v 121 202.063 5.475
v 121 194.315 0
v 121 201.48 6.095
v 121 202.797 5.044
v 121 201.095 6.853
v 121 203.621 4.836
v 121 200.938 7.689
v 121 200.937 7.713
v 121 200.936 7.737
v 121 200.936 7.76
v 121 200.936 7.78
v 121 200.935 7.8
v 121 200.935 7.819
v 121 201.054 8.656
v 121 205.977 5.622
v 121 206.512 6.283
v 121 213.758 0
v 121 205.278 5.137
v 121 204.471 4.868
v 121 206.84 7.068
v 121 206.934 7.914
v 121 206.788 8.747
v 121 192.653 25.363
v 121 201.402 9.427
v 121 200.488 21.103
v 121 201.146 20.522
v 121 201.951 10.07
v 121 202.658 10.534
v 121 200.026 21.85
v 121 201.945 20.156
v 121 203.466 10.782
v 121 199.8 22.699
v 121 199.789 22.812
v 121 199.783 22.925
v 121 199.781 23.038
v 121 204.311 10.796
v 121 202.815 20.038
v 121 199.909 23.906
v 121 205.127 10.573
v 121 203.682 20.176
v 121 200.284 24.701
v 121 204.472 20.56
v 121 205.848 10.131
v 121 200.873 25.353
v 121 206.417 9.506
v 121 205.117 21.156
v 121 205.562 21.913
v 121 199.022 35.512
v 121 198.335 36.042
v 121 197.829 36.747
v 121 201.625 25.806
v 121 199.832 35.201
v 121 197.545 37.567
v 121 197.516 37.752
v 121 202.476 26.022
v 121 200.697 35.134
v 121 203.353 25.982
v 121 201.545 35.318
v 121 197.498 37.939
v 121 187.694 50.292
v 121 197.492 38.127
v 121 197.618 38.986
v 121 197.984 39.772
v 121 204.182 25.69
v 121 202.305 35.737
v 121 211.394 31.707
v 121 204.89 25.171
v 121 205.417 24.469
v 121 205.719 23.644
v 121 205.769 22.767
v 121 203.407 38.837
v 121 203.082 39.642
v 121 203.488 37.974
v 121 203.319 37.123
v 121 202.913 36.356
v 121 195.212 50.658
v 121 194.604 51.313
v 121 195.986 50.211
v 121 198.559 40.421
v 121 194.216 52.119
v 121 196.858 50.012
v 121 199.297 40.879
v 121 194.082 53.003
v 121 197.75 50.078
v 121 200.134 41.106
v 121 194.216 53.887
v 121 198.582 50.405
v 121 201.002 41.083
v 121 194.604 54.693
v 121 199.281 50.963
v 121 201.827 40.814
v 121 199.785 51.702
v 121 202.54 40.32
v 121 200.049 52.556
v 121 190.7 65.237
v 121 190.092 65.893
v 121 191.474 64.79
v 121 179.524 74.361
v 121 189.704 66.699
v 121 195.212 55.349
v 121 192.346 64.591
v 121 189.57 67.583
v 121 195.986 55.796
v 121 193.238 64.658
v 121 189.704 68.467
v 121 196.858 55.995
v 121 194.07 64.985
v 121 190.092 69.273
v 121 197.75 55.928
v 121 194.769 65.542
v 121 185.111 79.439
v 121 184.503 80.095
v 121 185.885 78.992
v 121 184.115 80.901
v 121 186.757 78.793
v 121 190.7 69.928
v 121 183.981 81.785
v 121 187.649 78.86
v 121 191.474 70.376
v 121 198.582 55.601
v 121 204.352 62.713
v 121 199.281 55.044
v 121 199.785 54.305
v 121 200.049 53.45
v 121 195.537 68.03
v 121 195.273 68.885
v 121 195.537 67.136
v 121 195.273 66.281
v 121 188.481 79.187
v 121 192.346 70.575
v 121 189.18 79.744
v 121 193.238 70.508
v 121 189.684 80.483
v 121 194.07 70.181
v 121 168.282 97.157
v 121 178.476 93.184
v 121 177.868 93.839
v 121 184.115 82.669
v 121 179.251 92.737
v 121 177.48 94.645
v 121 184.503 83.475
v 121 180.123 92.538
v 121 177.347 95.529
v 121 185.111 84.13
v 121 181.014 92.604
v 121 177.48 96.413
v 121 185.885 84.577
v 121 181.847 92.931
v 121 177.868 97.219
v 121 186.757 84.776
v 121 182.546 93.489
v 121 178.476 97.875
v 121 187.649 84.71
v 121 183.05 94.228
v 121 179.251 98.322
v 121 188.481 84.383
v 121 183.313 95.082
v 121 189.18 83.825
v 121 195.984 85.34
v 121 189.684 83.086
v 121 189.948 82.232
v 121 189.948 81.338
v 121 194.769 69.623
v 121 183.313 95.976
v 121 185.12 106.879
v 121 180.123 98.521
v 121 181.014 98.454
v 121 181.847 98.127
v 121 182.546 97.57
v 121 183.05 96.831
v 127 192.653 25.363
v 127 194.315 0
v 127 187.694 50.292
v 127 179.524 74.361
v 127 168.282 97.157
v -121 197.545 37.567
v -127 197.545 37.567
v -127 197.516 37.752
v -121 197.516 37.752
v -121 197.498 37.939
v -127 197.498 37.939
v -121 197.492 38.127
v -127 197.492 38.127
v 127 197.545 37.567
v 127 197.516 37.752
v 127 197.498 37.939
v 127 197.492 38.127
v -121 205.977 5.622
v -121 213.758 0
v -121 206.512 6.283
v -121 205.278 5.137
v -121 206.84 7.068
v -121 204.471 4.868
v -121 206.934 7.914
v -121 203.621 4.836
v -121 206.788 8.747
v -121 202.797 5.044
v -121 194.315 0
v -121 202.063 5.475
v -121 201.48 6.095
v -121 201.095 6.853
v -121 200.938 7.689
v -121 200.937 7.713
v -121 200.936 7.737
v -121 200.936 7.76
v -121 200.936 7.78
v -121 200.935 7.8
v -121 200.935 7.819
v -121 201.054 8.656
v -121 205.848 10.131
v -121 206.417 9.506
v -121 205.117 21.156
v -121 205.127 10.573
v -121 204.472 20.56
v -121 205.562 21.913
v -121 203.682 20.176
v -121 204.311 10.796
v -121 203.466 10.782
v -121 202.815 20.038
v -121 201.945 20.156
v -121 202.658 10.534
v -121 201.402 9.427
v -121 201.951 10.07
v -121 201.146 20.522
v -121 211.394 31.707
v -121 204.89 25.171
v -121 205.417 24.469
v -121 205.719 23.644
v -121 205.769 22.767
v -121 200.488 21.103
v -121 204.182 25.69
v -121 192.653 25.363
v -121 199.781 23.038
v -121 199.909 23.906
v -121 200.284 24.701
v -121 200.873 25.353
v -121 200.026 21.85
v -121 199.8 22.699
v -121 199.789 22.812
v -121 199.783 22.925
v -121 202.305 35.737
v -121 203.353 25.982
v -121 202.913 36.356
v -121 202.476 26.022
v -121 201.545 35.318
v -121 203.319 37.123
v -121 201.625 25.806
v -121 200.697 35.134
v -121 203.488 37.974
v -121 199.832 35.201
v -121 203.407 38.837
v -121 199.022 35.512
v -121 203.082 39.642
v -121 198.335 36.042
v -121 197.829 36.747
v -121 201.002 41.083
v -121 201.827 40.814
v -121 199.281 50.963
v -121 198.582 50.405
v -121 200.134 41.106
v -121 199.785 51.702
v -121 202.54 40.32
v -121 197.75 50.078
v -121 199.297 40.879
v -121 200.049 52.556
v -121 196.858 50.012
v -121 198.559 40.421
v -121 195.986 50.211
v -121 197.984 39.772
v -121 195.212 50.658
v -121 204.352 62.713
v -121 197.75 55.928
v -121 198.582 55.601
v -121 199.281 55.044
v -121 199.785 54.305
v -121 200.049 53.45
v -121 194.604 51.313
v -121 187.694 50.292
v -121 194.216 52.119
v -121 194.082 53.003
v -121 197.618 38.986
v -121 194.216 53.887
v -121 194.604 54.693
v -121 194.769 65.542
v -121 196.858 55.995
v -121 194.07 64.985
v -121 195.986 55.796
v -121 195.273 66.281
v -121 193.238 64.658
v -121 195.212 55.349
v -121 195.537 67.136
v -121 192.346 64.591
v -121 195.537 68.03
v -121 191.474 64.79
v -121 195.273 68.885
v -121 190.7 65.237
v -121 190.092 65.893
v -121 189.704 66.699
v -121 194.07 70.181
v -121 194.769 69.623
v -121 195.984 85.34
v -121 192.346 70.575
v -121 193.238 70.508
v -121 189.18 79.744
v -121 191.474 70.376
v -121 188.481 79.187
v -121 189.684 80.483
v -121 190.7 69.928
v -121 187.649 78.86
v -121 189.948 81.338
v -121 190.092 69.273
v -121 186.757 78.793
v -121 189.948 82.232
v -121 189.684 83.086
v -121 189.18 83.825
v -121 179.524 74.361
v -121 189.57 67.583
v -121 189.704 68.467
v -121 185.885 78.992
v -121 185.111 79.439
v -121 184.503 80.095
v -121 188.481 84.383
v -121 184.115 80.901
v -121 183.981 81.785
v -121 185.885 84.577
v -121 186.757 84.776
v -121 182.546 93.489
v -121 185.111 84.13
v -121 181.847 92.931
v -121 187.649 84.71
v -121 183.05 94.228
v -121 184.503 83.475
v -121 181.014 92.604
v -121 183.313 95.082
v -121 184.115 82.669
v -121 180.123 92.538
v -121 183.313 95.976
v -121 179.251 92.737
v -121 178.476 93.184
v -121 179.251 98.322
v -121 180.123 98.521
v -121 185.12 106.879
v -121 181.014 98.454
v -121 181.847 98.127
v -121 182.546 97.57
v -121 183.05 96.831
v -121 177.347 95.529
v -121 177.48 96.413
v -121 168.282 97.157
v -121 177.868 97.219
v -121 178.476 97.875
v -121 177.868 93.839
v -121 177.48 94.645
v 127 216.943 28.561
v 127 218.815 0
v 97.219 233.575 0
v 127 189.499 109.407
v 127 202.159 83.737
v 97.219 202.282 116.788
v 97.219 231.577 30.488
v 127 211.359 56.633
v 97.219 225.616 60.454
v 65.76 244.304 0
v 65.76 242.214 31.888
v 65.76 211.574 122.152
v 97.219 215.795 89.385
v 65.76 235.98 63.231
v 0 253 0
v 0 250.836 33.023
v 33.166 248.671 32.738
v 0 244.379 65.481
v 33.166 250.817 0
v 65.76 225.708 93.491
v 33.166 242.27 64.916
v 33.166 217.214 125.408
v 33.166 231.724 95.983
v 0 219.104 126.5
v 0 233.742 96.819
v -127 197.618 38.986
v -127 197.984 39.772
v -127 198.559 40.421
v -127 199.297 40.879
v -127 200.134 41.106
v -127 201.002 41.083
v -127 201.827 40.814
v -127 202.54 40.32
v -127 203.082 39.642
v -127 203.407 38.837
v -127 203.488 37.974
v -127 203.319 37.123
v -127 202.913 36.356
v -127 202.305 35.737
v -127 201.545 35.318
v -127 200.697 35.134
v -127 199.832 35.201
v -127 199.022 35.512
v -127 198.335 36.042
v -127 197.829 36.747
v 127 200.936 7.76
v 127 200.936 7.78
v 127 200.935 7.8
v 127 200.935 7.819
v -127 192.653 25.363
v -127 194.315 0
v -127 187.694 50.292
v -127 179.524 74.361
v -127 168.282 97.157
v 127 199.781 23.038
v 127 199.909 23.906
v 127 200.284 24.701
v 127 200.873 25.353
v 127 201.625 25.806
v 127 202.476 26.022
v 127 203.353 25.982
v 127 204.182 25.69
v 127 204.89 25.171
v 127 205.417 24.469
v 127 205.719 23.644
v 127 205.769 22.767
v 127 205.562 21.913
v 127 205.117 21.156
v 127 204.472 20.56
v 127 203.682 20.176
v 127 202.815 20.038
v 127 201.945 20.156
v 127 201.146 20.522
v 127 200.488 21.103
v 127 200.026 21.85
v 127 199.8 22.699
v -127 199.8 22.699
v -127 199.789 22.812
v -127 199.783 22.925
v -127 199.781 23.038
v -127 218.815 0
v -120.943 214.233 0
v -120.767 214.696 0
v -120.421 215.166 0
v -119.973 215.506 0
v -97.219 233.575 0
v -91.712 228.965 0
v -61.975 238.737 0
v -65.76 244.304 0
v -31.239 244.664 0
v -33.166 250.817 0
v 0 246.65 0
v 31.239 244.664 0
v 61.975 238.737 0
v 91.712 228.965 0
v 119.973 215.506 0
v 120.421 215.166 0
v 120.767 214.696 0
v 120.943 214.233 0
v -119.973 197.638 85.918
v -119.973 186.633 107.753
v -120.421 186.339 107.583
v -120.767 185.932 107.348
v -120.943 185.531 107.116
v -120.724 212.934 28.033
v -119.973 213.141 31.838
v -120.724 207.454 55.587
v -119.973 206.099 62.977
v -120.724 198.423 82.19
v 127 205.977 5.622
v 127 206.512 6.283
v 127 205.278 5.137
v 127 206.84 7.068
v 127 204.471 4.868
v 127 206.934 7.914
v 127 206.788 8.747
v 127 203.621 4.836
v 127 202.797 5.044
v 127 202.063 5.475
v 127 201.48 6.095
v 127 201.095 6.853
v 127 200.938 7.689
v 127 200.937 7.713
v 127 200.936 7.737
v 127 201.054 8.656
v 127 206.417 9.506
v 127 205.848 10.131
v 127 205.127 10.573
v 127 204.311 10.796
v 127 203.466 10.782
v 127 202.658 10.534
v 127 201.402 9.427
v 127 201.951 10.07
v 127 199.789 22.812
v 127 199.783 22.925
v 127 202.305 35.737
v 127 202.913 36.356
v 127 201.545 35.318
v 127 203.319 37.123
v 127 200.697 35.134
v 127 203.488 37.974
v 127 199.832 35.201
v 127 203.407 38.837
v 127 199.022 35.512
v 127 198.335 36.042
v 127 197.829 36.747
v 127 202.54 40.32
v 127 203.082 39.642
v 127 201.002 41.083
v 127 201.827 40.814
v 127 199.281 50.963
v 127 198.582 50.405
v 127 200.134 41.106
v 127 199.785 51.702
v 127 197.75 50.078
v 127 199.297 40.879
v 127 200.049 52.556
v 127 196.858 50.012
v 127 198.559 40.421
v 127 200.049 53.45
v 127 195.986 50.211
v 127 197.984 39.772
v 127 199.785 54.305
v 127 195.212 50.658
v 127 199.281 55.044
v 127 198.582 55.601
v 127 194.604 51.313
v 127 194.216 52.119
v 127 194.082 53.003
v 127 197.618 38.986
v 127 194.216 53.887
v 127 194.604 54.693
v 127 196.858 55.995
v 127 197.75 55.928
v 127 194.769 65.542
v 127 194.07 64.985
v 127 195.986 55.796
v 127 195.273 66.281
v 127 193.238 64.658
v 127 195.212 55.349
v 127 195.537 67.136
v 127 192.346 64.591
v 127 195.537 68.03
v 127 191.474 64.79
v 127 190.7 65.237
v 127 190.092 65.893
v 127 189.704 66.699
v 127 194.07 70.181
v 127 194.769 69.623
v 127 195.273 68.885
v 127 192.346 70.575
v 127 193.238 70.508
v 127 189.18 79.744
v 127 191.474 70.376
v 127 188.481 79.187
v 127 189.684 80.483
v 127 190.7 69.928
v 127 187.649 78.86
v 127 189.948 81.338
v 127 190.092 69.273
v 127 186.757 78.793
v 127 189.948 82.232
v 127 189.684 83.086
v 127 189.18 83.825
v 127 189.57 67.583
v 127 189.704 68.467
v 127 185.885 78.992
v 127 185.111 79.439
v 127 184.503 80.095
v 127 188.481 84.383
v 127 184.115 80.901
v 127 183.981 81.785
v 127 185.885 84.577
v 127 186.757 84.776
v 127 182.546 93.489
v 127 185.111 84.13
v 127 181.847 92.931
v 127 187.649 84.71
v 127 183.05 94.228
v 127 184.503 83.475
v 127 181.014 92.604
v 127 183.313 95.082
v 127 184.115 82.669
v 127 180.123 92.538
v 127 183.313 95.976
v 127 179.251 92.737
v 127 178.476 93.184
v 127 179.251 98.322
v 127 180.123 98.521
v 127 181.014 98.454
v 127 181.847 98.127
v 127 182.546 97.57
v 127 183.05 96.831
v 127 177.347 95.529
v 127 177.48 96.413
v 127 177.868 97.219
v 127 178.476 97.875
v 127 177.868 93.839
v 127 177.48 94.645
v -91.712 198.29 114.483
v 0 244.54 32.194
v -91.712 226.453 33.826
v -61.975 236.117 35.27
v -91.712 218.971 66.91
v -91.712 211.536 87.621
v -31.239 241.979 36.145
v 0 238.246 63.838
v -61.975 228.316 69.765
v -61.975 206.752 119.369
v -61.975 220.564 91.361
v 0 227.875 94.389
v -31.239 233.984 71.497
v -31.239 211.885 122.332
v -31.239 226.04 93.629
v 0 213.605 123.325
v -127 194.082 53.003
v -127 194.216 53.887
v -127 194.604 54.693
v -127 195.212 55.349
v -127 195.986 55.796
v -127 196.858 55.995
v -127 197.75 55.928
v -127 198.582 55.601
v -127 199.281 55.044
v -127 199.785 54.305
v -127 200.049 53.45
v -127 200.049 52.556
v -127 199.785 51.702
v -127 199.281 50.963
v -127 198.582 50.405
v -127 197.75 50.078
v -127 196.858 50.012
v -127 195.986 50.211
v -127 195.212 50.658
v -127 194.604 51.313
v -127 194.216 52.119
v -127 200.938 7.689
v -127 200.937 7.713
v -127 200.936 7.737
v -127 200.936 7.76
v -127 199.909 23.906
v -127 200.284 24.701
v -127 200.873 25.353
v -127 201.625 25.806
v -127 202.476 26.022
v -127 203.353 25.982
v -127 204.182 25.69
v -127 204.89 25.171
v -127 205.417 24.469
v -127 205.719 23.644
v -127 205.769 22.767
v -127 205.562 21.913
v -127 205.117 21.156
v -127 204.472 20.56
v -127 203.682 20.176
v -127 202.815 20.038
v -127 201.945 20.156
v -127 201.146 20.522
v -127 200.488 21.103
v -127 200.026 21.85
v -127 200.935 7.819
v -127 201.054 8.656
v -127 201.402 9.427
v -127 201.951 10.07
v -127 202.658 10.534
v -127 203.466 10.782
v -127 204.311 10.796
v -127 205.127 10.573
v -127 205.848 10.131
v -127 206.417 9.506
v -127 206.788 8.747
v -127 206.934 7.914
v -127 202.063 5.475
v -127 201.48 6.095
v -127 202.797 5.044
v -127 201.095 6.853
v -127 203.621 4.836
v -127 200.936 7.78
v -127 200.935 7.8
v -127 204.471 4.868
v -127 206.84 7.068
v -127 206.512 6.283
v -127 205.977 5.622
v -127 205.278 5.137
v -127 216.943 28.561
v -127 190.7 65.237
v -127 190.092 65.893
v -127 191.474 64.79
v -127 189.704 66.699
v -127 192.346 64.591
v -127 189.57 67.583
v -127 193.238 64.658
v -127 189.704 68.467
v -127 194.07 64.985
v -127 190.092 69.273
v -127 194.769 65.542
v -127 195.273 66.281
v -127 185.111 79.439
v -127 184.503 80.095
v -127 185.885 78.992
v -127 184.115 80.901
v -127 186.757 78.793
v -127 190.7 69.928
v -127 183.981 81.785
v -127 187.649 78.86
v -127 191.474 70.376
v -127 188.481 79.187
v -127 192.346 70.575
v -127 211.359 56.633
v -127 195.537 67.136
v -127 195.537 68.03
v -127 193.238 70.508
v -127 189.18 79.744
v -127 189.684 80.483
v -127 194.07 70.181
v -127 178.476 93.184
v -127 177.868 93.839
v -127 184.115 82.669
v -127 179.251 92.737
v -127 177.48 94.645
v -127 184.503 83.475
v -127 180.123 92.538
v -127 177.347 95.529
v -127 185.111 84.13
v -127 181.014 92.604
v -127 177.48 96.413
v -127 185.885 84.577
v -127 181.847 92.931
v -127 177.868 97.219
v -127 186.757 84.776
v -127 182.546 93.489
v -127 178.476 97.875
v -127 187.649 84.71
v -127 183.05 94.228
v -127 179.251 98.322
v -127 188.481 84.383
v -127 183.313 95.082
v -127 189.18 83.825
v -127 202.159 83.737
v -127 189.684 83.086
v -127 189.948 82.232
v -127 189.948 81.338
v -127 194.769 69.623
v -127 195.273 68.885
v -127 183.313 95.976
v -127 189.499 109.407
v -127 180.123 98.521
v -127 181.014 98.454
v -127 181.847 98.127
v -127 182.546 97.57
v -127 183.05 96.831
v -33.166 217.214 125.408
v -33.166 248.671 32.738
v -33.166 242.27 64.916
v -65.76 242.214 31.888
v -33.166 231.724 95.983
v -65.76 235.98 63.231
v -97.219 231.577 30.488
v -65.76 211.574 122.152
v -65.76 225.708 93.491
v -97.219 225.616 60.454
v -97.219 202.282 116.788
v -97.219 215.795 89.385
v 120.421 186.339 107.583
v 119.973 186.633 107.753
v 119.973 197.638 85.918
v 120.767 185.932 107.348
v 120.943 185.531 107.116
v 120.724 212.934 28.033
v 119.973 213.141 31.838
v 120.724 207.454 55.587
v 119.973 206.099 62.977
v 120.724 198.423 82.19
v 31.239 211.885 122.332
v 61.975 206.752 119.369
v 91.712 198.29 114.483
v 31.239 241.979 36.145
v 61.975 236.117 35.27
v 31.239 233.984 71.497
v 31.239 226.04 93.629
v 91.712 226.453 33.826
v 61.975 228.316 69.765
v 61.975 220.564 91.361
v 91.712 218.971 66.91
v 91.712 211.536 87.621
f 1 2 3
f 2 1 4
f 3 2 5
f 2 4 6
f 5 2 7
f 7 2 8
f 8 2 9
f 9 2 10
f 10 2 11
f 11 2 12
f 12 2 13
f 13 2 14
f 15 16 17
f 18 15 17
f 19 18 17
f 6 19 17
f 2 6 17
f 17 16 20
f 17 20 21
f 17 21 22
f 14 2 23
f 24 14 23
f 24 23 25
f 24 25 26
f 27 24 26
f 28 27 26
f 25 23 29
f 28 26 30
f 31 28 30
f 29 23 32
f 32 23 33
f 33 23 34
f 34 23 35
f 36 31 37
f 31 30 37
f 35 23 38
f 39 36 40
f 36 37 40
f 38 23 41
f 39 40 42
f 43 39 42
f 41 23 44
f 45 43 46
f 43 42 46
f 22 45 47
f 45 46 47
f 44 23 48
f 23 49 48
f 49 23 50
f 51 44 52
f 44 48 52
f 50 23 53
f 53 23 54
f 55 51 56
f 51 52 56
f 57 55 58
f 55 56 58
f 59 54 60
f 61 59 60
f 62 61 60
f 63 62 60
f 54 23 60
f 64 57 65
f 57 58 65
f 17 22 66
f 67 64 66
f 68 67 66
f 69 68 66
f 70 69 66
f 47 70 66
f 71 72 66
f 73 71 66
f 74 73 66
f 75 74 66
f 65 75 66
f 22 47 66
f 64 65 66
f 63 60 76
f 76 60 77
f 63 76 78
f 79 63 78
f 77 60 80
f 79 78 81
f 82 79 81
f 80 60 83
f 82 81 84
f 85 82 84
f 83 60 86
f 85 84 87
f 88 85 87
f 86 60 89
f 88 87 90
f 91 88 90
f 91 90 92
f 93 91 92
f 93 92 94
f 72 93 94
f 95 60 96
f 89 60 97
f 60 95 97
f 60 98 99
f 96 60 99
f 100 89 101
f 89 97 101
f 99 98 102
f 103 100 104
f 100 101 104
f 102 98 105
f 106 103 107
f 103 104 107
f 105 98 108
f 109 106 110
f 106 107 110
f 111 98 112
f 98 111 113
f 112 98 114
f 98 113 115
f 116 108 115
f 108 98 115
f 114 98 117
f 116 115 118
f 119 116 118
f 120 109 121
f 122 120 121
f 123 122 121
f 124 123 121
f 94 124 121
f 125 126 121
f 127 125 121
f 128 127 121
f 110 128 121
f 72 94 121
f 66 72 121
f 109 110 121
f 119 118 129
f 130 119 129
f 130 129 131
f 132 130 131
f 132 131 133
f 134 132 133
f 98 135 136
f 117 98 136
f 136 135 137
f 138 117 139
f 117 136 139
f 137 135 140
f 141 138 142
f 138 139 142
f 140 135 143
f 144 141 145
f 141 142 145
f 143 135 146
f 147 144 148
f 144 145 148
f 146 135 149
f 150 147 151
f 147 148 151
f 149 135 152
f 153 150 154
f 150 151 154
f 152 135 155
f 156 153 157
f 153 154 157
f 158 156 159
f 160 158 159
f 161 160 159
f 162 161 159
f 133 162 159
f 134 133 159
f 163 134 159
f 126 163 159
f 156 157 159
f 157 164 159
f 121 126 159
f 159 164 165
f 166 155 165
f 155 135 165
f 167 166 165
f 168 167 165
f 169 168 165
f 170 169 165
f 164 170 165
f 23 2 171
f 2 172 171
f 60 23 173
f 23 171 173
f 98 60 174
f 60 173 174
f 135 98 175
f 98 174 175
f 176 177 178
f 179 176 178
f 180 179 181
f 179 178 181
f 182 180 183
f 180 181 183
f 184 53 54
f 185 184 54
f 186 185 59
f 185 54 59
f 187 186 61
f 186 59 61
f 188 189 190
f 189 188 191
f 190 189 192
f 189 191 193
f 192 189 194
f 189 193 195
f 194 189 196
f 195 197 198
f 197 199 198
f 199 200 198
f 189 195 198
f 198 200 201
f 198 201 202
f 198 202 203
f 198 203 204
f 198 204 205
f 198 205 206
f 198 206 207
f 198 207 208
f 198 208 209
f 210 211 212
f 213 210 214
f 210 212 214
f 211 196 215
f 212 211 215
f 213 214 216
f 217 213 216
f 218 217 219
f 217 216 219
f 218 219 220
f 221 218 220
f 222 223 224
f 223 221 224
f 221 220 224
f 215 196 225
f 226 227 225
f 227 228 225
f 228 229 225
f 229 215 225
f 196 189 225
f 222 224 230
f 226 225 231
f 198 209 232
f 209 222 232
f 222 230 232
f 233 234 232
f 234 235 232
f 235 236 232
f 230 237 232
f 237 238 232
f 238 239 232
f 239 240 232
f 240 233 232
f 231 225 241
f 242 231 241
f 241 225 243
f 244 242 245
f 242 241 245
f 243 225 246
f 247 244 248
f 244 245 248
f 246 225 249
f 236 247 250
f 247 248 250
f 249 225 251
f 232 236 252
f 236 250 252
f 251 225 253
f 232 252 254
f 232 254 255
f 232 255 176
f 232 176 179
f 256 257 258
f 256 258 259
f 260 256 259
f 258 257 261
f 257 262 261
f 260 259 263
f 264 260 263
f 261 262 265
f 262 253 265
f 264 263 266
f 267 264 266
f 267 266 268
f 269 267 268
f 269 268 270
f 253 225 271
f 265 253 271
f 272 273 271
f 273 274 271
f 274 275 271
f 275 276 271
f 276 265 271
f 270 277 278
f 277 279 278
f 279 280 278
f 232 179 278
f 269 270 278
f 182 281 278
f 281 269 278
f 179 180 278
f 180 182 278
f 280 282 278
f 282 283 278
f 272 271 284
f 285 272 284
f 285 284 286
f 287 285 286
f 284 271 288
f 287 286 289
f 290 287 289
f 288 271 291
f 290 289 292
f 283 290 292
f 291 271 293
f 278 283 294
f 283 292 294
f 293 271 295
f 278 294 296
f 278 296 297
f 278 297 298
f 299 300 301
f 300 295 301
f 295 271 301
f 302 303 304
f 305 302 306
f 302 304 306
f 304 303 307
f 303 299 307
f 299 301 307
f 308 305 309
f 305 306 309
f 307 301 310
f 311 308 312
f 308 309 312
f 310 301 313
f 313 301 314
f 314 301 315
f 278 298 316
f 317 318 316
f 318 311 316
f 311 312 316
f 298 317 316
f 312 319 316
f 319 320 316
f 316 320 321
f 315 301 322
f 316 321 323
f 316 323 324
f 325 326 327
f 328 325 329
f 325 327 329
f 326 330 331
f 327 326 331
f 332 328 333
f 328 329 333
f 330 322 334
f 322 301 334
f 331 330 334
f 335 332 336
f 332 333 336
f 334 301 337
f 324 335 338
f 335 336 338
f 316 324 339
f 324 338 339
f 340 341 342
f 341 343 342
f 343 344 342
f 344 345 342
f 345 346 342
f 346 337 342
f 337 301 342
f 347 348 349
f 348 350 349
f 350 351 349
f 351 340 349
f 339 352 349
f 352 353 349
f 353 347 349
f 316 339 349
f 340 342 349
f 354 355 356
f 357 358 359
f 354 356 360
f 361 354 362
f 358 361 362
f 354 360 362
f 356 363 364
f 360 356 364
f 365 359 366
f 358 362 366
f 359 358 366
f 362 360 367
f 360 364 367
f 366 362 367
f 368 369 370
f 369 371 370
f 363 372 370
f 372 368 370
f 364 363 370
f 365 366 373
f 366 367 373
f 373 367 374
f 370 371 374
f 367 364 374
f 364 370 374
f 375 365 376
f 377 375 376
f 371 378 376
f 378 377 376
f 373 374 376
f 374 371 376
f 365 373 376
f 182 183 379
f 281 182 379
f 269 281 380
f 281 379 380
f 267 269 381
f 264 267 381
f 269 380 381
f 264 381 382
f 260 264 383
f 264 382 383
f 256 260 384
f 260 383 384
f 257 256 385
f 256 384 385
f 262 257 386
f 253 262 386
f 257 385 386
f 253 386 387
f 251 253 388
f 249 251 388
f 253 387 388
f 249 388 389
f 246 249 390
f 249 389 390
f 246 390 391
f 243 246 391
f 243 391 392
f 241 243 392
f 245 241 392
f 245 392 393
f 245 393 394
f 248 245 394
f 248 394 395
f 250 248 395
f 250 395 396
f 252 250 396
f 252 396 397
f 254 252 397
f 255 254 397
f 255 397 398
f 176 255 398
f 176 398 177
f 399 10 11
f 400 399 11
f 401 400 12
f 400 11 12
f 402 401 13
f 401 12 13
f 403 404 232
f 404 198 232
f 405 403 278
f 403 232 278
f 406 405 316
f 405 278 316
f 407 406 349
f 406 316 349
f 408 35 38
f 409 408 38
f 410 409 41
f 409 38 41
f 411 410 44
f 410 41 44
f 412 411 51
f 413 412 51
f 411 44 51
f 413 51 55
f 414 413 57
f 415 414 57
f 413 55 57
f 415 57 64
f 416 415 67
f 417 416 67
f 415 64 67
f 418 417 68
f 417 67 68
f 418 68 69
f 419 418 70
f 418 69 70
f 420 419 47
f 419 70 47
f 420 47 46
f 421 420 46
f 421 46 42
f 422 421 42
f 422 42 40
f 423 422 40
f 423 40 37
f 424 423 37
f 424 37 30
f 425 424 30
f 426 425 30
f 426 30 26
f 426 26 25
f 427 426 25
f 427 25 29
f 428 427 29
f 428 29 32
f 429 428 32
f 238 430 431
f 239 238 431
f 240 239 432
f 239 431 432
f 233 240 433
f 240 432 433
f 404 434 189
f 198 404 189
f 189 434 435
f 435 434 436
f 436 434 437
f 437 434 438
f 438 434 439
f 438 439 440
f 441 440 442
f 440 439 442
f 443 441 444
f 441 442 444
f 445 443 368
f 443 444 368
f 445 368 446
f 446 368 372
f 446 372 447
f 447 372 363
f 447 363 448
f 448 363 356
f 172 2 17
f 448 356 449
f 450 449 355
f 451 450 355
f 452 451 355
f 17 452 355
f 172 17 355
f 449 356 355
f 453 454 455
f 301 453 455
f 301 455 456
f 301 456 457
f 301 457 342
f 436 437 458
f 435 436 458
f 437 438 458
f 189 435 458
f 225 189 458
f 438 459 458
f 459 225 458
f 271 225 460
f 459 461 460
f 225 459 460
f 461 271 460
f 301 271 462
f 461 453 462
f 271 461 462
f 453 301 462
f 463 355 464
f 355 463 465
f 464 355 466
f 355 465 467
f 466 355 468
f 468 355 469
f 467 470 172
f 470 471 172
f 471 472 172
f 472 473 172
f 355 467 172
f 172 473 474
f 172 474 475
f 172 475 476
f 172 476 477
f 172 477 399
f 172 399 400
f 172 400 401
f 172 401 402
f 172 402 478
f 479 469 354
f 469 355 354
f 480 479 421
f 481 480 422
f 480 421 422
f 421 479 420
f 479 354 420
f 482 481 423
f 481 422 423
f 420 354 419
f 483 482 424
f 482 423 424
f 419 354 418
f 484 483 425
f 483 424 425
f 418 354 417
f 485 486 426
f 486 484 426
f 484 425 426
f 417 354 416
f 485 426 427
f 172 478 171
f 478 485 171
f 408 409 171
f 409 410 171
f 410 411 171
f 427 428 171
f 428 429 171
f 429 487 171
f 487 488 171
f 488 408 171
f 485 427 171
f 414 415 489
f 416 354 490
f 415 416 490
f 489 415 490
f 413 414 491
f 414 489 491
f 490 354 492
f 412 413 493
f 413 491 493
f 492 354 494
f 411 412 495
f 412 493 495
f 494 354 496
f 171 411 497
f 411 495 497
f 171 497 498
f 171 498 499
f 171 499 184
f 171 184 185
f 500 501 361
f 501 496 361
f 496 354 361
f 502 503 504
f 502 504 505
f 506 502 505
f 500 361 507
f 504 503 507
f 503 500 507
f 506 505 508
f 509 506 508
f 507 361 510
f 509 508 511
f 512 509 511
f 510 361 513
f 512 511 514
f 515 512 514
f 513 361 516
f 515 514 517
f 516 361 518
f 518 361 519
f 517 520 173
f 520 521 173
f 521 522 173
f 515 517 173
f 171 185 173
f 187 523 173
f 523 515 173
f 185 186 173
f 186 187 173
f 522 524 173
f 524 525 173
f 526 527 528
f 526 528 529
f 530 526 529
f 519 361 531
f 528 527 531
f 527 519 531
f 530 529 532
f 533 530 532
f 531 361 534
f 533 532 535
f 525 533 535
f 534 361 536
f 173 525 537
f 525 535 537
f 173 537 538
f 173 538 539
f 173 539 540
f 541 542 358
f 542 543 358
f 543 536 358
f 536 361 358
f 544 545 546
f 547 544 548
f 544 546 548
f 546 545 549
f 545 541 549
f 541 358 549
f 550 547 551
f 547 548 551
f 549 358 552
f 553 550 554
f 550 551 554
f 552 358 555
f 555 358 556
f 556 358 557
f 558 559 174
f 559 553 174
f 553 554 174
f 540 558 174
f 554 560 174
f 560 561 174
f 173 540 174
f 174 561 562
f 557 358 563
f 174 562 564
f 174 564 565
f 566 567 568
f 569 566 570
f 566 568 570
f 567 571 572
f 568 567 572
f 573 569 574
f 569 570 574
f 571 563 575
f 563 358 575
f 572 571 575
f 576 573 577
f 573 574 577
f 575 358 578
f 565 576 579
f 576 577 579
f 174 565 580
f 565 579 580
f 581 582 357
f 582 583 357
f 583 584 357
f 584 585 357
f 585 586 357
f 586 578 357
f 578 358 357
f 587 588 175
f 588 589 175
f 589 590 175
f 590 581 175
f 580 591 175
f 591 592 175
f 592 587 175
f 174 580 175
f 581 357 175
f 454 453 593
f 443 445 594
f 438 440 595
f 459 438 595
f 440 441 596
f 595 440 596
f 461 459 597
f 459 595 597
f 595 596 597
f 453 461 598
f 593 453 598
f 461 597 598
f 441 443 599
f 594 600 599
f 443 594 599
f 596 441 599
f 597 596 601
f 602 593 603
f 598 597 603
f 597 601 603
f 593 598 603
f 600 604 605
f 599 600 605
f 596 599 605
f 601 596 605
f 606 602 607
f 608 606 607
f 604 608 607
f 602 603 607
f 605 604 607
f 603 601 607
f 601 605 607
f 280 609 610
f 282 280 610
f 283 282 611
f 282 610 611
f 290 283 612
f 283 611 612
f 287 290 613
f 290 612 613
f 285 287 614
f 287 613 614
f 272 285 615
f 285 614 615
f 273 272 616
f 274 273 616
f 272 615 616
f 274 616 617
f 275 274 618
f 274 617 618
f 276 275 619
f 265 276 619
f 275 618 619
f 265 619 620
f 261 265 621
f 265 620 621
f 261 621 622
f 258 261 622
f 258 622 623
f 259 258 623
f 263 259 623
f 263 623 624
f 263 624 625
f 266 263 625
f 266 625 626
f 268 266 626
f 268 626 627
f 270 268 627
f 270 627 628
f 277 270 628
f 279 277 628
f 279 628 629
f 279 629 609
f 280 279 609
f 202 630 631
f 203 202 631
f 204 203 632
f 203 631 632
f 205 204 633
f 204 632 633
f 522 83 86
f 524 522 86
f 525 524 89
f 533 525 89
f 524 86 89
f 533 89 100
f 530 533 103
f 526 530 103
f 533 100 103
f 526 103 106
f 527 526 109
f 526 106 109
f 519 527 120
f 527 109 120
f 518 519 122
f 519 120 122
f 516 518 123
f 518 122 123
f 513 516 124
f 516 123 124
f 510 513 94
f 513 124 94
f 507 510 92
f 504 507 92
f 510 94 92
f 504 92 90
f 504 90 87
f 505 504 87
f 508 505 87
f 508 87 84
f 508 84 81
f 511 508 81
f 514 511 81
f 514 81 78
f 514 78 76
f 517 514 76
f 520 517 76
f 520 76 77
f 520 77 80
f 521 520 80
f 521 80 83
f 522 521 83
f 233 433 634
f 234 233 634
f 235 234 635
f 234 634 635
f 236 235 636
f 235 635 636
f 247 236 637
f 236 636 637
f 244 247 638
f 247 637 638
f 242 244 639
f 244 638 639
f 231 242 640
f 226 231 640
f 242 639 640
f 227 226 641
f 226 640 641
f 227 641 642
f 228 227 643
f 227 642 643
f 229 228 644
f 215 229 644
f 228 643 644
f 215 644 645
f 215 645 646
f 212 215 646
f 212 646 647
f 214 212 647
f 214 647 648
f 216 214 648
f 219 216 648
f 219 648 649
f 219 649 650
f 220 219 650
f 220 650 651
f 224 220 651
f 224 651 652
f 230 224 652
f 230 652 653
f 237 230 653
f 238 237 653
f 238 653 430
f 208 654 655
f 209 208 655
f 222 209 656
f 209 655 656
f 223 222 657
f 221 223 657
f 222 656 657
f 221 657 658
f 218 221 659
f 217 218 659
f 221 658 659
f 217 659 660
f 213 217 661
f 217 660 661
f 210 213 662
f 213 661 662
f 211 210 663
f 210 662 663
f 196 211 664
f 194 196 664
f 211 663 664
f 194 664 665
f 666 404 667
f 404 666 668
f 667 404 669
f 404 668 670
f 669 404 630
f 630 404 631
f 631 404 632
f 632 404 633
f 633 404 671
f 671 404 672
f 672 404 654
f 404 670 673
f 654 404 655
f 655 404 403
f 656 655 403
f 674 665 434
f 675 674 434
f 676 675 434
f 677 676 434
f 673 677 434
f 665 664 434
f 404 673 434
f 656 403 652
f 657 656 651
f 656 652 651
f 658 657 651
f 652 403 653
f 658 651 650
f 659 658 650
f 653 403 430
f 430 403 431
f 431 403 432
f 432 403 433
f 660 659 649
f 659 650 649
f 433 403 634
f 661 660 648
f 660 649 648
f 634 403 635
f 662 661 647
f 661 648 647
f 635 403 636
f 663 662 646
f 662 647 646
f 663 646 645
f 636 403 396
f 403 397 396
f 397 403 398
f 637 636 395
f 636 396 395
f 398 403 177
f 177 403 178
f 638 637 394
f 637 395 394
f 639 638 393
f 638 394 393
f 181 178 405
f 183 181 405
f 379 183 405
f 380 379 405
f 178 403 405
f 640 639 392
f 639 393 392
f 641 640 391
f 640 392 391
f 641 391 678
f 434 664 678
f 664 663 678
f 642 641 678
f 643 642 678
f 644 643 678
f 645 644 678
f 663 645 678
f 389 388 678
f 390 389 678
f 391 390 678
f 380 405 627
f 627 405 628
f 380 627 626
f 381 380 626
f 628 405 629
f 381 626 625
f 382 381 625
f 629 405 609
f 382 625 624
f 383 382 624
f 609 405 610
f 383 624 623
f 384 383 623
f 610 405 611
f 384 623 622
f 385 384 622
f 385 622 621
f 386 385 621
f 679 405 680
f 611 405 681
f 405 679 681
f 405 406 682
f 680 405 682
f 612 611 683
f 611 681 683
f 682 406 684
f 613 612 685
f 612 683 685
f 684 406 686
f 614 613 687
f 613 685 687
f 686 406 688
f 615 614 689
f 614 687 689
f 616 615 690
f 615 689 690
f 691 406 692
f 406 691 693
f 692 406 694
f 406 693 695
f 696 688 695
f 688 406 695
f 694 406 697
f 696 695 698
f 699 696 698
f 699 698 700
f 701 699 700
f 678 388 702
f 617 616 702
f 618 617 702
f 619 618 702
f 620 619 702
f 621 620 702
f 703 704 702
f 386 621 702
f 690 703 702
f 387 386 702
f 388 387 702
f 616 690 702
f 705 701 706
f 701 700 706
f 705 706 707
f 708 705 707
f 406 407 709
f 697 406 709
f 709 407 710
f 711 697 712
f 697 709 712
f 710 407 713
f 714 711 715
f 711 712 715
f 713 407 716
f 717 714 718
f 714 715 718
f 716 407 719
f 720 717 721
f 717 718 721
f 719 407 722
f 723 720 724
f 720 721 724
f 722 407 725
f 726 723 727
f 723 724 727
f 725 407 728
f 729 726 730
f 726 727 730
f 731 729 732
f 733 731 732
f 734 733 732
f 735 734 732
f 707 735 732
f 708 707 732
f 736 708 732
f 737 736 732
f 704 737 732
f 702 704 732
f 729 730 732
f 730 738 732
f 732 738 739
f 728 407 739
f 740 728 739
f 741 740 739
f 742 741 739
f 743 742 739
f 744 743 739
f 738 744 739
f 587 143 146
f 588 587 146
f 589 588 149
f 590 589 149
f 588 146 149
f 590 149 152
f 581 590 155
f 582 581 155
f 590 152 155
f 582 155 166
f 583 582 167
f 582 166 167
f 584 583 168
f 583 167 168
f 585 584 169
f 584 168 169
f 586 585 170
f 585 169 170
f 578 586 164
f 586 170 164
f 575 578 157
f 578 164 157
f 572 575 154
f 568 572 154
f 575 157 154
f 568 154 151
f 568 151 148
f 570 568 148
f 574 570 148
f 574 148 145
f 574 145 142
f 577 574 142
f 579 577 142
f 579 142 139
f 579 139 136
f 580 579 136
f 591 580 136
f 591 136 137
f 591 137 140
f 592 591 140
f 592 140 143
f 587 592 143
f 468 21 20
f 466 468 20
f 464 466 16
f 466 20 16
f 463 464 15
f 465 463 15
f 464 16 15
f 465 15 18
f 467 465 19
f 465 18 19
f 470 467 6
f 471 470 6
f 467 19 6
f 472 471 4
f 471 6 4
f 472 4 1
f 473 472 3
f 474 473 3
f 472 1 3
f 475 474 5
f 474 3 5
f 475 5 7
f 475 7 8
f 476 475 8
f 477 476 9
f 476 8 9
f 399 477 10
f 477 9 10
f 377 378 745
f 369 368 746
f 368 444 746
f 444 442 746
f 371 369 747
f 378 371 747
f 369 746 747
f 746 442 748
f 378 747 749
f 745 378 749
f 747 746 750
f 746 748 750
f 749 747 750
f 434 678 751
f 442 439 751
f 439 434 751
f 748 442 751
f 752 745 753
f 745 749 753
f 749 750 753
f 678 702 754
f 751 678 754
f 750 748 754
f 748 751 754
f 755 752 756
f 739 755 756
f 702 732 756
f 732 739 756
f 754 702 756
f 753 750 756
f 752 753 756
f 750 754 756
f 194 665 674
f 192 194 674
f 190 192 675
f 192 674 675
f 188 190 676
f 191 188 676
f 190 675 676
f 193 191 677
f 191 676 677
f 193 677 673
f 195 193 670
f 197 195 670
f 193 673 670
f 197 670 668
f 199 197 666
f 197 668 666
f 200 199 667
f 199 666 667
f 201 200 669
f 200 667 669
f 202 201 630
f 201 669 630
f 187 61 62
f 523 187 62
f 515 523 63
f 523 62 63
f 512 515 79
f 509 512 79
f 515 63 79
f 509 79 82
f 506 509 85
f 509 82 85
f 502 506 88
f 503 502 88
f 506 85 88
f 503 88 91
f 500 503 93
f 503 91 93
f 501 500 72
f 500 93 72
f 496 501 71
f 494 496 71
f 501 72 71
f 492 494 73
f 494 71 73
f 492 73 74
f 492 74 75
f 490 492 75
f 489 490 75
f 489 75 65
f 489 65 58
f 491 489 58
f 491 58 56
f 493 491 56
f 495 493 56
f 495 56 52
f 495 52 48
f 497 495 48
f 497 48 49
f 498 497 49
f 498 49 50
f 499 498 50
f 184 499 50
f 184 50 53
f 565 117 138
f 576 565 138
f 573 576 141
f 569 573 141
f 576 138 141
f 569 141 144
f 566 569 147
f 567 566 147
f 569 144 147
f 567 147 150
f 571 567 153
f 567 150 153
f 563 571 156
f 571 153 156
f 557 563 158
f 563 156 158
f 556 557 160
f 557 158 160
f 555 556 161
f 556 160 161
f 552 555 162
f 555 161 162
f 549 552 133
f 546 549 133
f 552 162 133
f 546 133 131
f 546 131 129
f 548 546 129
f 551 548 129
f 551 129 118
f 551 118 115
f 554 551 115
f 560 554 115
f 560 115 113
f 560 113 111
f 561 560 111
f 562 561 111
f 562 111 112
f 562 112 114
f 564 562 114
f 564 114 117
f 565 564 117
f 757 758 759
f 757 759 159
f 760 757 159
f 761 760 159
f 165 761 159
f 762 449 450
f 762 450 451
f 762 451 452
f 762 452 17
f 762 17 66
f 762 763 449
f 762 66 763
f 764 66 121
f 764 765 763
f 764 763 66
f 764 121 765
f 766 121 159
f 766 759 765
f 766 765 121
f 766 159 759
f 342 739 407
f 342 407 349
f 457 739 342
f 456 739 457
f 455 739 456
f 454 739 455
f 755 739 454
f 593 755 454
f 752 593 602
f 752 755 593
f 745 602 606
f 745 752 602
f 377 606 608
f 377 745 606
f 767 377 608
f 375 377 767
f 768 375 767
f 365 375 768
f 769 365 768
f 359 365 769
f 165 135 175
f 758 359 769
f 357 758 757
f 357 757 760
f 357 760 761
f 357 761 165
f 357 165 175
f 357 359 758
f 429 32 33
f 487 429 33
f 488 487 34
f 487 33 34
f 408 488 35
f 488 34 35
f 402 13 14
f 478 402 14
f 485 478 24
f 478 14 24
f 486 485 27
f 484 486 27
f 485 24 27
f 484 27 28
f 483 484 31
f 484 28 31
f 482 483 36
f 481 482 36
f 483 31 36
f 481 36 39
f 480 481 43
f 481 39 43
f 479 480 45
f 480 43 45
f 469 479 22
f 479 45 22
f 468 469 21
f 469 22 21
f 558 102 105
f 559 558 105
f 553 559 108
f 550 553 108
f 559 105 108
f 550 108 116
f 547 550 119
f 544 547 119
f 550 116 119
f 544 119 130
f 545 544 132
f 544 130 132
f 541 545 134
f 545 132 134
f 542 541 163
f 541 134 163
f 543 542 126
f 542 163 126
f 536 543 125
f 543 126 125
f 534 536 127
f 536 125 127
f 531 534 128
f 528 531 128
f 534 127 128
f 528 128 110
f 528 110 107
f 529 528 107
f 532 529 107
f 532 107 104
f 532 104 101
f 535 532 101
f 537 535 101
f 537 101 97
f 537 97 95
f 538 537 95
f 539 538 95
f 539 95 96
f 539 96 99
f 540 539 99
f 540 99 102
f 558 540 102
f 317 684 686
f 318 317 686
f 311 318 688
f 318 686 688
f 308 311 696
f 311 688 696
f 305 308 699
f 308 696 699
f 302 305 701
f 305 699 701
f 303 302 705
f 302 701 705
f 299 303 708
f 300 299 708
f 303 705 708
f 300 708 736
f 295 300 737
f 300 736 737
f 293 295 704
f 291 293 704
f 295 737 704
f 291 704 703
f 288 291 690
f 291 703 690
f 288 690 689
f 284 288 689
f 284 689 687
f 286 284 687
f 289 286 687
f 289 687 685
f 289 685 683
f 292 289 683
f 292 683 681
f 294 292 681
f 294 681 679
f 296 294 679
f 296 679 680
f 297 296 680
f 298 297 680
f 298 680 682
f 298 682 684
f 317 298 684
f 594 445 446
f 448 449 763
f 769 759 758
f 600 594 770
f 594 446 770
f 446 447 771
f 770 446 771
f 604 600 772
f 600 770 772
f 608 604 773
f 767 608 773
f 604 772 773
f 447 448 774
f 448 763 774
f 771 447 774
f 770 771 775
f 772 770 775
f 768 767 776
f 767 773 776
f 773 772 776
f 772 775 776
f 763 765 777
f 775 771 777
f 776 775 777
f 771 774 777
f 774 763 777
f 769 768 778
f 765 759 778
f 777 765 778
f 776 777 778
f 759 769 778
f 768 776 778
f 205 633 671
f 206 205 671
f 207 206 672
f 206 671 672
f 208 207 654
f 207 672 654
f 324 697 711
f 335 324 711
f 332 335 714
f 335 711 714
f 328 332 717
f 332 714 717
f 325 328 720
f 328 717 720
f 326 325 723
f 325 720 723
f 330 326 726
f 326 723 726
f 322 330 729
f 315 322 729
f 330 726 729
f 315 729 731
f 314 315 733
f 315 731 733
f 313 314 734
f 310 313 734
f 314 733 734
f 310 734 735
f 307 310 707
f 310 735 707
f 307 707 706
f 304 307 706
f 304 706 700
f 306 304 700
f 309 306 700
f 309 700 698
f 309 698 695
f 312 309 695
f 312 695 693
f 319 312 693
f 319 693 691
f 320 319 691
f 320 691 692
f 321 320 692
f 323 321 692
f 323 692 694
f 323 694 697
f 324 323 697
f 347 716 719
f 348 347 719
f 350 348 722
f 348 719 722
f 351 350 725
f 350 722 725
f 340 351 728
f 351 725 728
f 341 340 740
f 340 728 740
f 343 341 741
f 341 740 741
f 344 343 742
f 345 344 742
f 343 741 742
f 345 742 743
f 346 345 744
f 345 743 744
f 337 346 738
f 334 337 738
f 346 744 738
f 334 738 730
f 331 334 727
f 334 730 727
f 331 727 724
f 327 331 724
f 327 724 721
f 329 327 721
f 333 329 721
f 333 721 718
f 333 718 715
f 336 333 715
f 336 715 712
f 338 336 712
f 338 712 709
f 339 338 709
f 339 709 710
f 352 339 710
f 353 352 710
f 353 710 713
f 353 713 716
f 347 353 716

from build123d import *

# Parameters (mm, degrees)
F1_ANGLE = 30
F2_R     = 2
F3_R     = 2
F4_R     = 3
F5_DEPTH = 254.001


with BuildPart() as f1:
    # F0 (on Top) → F1 (revolve)
    with BuildSketch(Plane.XY):
        with BuildLine():
            Line((127, 194.31499), (127, 218.81499))
            ThreePointArc((127, 218.81499), (65.760199, 244.304311), (0, 253))
            Line((0, 253), (0, 246.65))
            ThreePointArc((0, 246.65), (62.544207, 238.588442), (121, 214.930739))
            Line((121, 214.930739), (121, 194.31499))
            Line((121, 194.31499), (127, 194.31499))
        make_face()
        with BuildLine():
            Line((0, 246.65), (0, 253))
            ThreePointArc((0, 253), (-65.760199, 244.304311), (-127, 218.81499))
            Line((-127, 218.81499), (-127, 194.31499))
            Line((-127, 194.31499), (-121, 194.31499))
            Line((-121, 194.31499), (-121, 214.930739))
            ThreePointArc((-121, 214.930739), (-62.544207, 238.588442), (0, 246.65))
        make_face()
    revolve(axis=Axis((69.665767, 0, 0), (1, 0, 0)), revolution_arc=F1_ANGLE)

    # F2
    f2_edges = [f1.edges().sort_by_distance(p)[0] for p in [
        (121, 207.607152, 55.628169),
    ]]
    fillet(f2_edges, radius=F2_R)

    # F3
    f3_edges = [f1.edges().sort_by_distance(p)[0] for p in [
        (-121, 207.607152, 55.628169),
    ]]
    fillet(f3_edges, radius=F3_R)

    # F4 (on face) → F5 (cut, through all)
    with BuildSketch(Plane(origin=(-127, 0, 0), x_dir=(0, -1, 0), z_dir=(-1, 0, 0))):
        with BuildLine():
            ThreePointArc((-199.78076, 23.037602), (-205.775963, 23.207197), (-199.799935, 22.698955))
            ThreePointArc((-199.799935, 22.698955), (-199.785558, 22.868008), (-199.78076, 23.037602))
        make_face()
        with BuildLine():
            ThreePointArc((-197.492142, 38.12701), (-203.478908, 38.40848), (-197.544959, 37.566552))
            ThreePointArc((-197.544959, 37.566552), (-197.505375, 37.845539), (-197.492142, 38.12701))
        make_face()
        with BuildLine():
            ThreePointArc((-200.938163, 7.689393), (-200.936833, 7.724924), (-200.935924, 7.760468))
            ThreePointArc((-200.935924, 7.760468), (-200.935491, 7.789912), (-200.935346, 7.819359))
            ThreePointArc((-200.935346, 7.819359), (-203.888144, 10.818988), (-206.933861, 7.913752))
            Line((-206.933861, 7.913752), (-200.938163, 7.689393))
        make_face()
        with BuildLine():
            ThreePointArc((-206.933861, 7.913752), (-204.047527, 4.821457), (-200.938163, 7.689393))
            Line((-200.938163, 7.689393), (-206.933861, 7.913752))
        make_face()
        with Locations((-203.949443, -7.442613)):
            Circle(F4_R)
        with Locations((-202.822972, -22.662963)):
            Circle(F4_R)
        with Locations((-200.562232, -37.756572)):
            Circle(F4_R)
        with Locations((-197.179868, -52.639032)):
            Circle(F4_R)
        with Locations((-192.694793, -67.227112)):
            Circle(F4_R)
        with Locations((-187.132091, -81.439231)):
            Circle(F4_R)
        with Locations((-180.52287, -95.195909)):
            Circle(F4_R)
        with Locations((-172.904092, -108.420213)):
            Circle(F4_R)
        with Locations((-164.318365, -121.038187)):
            Circle(F4_R)
        with Locations((-154.813702, -132.979267)):
            Circle(F4_R)
        with Locations((-144.443259, -144.176672)):
            Circle(F4_R)
        with Locations((-133.26503, -154.567783)):
            Circle(F4_R)
        with Locations((-121.341529, -164.094489)):
            Circle(F4_R)
        with Locations((-108.739437, -172.703511)):
            Circle(F4_R)
        with Locations((-95.52923, -180.346705)):
            Circle(F4_R)
        with Locations((-81.784784, -186.981328)):
            Circle(F4_R)
        with Locations((-67.582966, -192.570274)):
            Circle(F4_R)
        with Locations((-53.003195, -197.08229)):
            Circle(F4_R)
        with Locations((-38.12701, -200.492142)):
            Circle(F4_R)
        with Locations((-23.037602, -202.78076)):
            Circle(F4_R)
        with Locations((-7.819359, -203.935346)):
            Circle(F4_R)
        with Locations((7.442613, -203.949443)):
            Circle(F4_R)
        with Locations((22.662963, -202.822972)):
            Circle(F4_R)
        with Locations((37.756572, -200.562232)):
            Circle(F4_R)
        with Locations((52.639032, -197.179868)):
            Circle(F4_R)
        with Locations((67.227112, -192.694793)):
            Circle(F4_R)
        with Locations((81.439231, -187.132091)):
            Circle(F4_R)
        with Locations((95.195909, -180.52287)):
            Circle(F4_R)
        with Locations((108.420213, -172.904092)):
            Circle(F4_R)
        with Locations((121.038187, -164.318365)):
            Circle(F4_R)
        with Locations((132.979267, -154.813702)):
            Circle(F4_R)
        with Locations((144.176672, -144.443259)):
            Circle(F4_R)
        with Locations((154.567783, -133.26503)):
            Circle(F4_R)
        with Locations((164.094489, -121.341529)):
            Circle(F4_R)
        with Locations((172.703511, -108.739437)):
            Circle(F4_R)
        with Locations((180.346705, -95.52923)):
            Circle(F4_R)
        with Locations((186.981328, -81.784784)):
            Circle(F4_R)
        with Locations((192.570274, -67.582966)):
            Circle(F4_R)
        with Locations((197.08229, -53.003195)):
            Circle(F4_R)
        with Locations((200.492142, -38.12701)):
            Circle(F4_R)
        with Locations((202.78076, -23.037602)):
            Circle(F4_R)
        with Locations((203.935346, -7.819359)):
            Circle(F4_R)
        with Locations((203.949443, 7.442613)):
            Circle(F4_R)
        with Locations((202.822972, 22.662963)):
            Circle(F4_R)
        with Locations((200.562232, 37.756572)):
            Circle(F4_R)
        with Locations((197.179868, 52.639032)):
            Circle(F4_R)
        with Locations((192.694793, 67.227112)):
            Circle(F4_R)
        with Locations((187.132091, 81.439231)):
            Circle(F4_R)
        with Locations((180.52287, 95.195909)):
            Circle(F4_R)
        with Locations((172.904092, 108.420213)):
            Circle(F4_R)
        with Locations((164.318365, 121.038187)):
            Circle(F4_R)
        with Locations((154.813702, 132.979267)):
            Circle(F4_R)
        with Locations((144.443259, 144.176672)):
            Circle(F4_R)
        with Locations((133.26503, 154.567783)):
            Circle(F4_R)
        with Locations((121.341529, 164.094489)):
            Circle(F4_R)
        with Locations((108.739437, 172.703511)):
            Circle(F4_R)
        with Locations((95.52923, 180.346705)):
            Circle(F4_R)
        with Locations((81.784784, 186.981328)):
            Circle(F4_R)
        with Locations((67.582966, 192.570274)):
            Circle(F4_R)
        with Locations((53.003195, 197.08229)):
            Circle(F4_R)
        with Locations((38.12701, 200.492142)):
            Circle(F4_R)
        with Locations((23.037602, 202.78076)):
            Circle(F4_R)
        with Locations((7.819359, 203.935346)):
            Circle(F4_R)
        with Locations((-7.442613, 203.949443)):
            Circle(F4_R)
        with Locations((-22.662963, 202.822972)):
            Circle(F4_R)
        with Locations((-37.756572, 200.562232)):
            Circle(F4_R)
        with Locations((-52.639032, 197.179868)):
            Circle(F4_R)
        with Locations((-67.227112, 192.694793)):
            Circle(F4_R)
        with Locations((-81.439231, 187.132091)):
            Circle(F4_R)
        with Locations((-95.195909, 180.52287)):
            Circle(F4_R)
        with Locations((-108.420213, 172.904092)):
            Circle(F4_R)
        with Locations((-121.038187, 164.318365)):
            Circle(F4_R)
        with Locations((-132.979267, 154.813702)):
            Circle(F4_R)
        with Locations((-144.176672, 144.443259)):
            Circle(F4_R)
        with Locations((-154.567783, 133.26503)):
            Circle(F4_R)
        with Locations((-164.094489, 121.341529)):
            Circle(F4_R)
        with Locations((-172.703511, 108.739437)):
            Circle(F4_R)
        with Locations((-180.346705, 95.52923)):
            Circle(F4_R)
        with Locations((-186.981328, 81.784784)):
            Circle(F4_R)
        with Locations((-192.570274, 67.582966)):
            Circle(F4_R)
        with Locations((-197.08229, 53.003195)):
            Circle(F4_R)
    extrude(amount=-F5_DEPTH, mode=Mode.SUBTRACT)


solid = f1.part
